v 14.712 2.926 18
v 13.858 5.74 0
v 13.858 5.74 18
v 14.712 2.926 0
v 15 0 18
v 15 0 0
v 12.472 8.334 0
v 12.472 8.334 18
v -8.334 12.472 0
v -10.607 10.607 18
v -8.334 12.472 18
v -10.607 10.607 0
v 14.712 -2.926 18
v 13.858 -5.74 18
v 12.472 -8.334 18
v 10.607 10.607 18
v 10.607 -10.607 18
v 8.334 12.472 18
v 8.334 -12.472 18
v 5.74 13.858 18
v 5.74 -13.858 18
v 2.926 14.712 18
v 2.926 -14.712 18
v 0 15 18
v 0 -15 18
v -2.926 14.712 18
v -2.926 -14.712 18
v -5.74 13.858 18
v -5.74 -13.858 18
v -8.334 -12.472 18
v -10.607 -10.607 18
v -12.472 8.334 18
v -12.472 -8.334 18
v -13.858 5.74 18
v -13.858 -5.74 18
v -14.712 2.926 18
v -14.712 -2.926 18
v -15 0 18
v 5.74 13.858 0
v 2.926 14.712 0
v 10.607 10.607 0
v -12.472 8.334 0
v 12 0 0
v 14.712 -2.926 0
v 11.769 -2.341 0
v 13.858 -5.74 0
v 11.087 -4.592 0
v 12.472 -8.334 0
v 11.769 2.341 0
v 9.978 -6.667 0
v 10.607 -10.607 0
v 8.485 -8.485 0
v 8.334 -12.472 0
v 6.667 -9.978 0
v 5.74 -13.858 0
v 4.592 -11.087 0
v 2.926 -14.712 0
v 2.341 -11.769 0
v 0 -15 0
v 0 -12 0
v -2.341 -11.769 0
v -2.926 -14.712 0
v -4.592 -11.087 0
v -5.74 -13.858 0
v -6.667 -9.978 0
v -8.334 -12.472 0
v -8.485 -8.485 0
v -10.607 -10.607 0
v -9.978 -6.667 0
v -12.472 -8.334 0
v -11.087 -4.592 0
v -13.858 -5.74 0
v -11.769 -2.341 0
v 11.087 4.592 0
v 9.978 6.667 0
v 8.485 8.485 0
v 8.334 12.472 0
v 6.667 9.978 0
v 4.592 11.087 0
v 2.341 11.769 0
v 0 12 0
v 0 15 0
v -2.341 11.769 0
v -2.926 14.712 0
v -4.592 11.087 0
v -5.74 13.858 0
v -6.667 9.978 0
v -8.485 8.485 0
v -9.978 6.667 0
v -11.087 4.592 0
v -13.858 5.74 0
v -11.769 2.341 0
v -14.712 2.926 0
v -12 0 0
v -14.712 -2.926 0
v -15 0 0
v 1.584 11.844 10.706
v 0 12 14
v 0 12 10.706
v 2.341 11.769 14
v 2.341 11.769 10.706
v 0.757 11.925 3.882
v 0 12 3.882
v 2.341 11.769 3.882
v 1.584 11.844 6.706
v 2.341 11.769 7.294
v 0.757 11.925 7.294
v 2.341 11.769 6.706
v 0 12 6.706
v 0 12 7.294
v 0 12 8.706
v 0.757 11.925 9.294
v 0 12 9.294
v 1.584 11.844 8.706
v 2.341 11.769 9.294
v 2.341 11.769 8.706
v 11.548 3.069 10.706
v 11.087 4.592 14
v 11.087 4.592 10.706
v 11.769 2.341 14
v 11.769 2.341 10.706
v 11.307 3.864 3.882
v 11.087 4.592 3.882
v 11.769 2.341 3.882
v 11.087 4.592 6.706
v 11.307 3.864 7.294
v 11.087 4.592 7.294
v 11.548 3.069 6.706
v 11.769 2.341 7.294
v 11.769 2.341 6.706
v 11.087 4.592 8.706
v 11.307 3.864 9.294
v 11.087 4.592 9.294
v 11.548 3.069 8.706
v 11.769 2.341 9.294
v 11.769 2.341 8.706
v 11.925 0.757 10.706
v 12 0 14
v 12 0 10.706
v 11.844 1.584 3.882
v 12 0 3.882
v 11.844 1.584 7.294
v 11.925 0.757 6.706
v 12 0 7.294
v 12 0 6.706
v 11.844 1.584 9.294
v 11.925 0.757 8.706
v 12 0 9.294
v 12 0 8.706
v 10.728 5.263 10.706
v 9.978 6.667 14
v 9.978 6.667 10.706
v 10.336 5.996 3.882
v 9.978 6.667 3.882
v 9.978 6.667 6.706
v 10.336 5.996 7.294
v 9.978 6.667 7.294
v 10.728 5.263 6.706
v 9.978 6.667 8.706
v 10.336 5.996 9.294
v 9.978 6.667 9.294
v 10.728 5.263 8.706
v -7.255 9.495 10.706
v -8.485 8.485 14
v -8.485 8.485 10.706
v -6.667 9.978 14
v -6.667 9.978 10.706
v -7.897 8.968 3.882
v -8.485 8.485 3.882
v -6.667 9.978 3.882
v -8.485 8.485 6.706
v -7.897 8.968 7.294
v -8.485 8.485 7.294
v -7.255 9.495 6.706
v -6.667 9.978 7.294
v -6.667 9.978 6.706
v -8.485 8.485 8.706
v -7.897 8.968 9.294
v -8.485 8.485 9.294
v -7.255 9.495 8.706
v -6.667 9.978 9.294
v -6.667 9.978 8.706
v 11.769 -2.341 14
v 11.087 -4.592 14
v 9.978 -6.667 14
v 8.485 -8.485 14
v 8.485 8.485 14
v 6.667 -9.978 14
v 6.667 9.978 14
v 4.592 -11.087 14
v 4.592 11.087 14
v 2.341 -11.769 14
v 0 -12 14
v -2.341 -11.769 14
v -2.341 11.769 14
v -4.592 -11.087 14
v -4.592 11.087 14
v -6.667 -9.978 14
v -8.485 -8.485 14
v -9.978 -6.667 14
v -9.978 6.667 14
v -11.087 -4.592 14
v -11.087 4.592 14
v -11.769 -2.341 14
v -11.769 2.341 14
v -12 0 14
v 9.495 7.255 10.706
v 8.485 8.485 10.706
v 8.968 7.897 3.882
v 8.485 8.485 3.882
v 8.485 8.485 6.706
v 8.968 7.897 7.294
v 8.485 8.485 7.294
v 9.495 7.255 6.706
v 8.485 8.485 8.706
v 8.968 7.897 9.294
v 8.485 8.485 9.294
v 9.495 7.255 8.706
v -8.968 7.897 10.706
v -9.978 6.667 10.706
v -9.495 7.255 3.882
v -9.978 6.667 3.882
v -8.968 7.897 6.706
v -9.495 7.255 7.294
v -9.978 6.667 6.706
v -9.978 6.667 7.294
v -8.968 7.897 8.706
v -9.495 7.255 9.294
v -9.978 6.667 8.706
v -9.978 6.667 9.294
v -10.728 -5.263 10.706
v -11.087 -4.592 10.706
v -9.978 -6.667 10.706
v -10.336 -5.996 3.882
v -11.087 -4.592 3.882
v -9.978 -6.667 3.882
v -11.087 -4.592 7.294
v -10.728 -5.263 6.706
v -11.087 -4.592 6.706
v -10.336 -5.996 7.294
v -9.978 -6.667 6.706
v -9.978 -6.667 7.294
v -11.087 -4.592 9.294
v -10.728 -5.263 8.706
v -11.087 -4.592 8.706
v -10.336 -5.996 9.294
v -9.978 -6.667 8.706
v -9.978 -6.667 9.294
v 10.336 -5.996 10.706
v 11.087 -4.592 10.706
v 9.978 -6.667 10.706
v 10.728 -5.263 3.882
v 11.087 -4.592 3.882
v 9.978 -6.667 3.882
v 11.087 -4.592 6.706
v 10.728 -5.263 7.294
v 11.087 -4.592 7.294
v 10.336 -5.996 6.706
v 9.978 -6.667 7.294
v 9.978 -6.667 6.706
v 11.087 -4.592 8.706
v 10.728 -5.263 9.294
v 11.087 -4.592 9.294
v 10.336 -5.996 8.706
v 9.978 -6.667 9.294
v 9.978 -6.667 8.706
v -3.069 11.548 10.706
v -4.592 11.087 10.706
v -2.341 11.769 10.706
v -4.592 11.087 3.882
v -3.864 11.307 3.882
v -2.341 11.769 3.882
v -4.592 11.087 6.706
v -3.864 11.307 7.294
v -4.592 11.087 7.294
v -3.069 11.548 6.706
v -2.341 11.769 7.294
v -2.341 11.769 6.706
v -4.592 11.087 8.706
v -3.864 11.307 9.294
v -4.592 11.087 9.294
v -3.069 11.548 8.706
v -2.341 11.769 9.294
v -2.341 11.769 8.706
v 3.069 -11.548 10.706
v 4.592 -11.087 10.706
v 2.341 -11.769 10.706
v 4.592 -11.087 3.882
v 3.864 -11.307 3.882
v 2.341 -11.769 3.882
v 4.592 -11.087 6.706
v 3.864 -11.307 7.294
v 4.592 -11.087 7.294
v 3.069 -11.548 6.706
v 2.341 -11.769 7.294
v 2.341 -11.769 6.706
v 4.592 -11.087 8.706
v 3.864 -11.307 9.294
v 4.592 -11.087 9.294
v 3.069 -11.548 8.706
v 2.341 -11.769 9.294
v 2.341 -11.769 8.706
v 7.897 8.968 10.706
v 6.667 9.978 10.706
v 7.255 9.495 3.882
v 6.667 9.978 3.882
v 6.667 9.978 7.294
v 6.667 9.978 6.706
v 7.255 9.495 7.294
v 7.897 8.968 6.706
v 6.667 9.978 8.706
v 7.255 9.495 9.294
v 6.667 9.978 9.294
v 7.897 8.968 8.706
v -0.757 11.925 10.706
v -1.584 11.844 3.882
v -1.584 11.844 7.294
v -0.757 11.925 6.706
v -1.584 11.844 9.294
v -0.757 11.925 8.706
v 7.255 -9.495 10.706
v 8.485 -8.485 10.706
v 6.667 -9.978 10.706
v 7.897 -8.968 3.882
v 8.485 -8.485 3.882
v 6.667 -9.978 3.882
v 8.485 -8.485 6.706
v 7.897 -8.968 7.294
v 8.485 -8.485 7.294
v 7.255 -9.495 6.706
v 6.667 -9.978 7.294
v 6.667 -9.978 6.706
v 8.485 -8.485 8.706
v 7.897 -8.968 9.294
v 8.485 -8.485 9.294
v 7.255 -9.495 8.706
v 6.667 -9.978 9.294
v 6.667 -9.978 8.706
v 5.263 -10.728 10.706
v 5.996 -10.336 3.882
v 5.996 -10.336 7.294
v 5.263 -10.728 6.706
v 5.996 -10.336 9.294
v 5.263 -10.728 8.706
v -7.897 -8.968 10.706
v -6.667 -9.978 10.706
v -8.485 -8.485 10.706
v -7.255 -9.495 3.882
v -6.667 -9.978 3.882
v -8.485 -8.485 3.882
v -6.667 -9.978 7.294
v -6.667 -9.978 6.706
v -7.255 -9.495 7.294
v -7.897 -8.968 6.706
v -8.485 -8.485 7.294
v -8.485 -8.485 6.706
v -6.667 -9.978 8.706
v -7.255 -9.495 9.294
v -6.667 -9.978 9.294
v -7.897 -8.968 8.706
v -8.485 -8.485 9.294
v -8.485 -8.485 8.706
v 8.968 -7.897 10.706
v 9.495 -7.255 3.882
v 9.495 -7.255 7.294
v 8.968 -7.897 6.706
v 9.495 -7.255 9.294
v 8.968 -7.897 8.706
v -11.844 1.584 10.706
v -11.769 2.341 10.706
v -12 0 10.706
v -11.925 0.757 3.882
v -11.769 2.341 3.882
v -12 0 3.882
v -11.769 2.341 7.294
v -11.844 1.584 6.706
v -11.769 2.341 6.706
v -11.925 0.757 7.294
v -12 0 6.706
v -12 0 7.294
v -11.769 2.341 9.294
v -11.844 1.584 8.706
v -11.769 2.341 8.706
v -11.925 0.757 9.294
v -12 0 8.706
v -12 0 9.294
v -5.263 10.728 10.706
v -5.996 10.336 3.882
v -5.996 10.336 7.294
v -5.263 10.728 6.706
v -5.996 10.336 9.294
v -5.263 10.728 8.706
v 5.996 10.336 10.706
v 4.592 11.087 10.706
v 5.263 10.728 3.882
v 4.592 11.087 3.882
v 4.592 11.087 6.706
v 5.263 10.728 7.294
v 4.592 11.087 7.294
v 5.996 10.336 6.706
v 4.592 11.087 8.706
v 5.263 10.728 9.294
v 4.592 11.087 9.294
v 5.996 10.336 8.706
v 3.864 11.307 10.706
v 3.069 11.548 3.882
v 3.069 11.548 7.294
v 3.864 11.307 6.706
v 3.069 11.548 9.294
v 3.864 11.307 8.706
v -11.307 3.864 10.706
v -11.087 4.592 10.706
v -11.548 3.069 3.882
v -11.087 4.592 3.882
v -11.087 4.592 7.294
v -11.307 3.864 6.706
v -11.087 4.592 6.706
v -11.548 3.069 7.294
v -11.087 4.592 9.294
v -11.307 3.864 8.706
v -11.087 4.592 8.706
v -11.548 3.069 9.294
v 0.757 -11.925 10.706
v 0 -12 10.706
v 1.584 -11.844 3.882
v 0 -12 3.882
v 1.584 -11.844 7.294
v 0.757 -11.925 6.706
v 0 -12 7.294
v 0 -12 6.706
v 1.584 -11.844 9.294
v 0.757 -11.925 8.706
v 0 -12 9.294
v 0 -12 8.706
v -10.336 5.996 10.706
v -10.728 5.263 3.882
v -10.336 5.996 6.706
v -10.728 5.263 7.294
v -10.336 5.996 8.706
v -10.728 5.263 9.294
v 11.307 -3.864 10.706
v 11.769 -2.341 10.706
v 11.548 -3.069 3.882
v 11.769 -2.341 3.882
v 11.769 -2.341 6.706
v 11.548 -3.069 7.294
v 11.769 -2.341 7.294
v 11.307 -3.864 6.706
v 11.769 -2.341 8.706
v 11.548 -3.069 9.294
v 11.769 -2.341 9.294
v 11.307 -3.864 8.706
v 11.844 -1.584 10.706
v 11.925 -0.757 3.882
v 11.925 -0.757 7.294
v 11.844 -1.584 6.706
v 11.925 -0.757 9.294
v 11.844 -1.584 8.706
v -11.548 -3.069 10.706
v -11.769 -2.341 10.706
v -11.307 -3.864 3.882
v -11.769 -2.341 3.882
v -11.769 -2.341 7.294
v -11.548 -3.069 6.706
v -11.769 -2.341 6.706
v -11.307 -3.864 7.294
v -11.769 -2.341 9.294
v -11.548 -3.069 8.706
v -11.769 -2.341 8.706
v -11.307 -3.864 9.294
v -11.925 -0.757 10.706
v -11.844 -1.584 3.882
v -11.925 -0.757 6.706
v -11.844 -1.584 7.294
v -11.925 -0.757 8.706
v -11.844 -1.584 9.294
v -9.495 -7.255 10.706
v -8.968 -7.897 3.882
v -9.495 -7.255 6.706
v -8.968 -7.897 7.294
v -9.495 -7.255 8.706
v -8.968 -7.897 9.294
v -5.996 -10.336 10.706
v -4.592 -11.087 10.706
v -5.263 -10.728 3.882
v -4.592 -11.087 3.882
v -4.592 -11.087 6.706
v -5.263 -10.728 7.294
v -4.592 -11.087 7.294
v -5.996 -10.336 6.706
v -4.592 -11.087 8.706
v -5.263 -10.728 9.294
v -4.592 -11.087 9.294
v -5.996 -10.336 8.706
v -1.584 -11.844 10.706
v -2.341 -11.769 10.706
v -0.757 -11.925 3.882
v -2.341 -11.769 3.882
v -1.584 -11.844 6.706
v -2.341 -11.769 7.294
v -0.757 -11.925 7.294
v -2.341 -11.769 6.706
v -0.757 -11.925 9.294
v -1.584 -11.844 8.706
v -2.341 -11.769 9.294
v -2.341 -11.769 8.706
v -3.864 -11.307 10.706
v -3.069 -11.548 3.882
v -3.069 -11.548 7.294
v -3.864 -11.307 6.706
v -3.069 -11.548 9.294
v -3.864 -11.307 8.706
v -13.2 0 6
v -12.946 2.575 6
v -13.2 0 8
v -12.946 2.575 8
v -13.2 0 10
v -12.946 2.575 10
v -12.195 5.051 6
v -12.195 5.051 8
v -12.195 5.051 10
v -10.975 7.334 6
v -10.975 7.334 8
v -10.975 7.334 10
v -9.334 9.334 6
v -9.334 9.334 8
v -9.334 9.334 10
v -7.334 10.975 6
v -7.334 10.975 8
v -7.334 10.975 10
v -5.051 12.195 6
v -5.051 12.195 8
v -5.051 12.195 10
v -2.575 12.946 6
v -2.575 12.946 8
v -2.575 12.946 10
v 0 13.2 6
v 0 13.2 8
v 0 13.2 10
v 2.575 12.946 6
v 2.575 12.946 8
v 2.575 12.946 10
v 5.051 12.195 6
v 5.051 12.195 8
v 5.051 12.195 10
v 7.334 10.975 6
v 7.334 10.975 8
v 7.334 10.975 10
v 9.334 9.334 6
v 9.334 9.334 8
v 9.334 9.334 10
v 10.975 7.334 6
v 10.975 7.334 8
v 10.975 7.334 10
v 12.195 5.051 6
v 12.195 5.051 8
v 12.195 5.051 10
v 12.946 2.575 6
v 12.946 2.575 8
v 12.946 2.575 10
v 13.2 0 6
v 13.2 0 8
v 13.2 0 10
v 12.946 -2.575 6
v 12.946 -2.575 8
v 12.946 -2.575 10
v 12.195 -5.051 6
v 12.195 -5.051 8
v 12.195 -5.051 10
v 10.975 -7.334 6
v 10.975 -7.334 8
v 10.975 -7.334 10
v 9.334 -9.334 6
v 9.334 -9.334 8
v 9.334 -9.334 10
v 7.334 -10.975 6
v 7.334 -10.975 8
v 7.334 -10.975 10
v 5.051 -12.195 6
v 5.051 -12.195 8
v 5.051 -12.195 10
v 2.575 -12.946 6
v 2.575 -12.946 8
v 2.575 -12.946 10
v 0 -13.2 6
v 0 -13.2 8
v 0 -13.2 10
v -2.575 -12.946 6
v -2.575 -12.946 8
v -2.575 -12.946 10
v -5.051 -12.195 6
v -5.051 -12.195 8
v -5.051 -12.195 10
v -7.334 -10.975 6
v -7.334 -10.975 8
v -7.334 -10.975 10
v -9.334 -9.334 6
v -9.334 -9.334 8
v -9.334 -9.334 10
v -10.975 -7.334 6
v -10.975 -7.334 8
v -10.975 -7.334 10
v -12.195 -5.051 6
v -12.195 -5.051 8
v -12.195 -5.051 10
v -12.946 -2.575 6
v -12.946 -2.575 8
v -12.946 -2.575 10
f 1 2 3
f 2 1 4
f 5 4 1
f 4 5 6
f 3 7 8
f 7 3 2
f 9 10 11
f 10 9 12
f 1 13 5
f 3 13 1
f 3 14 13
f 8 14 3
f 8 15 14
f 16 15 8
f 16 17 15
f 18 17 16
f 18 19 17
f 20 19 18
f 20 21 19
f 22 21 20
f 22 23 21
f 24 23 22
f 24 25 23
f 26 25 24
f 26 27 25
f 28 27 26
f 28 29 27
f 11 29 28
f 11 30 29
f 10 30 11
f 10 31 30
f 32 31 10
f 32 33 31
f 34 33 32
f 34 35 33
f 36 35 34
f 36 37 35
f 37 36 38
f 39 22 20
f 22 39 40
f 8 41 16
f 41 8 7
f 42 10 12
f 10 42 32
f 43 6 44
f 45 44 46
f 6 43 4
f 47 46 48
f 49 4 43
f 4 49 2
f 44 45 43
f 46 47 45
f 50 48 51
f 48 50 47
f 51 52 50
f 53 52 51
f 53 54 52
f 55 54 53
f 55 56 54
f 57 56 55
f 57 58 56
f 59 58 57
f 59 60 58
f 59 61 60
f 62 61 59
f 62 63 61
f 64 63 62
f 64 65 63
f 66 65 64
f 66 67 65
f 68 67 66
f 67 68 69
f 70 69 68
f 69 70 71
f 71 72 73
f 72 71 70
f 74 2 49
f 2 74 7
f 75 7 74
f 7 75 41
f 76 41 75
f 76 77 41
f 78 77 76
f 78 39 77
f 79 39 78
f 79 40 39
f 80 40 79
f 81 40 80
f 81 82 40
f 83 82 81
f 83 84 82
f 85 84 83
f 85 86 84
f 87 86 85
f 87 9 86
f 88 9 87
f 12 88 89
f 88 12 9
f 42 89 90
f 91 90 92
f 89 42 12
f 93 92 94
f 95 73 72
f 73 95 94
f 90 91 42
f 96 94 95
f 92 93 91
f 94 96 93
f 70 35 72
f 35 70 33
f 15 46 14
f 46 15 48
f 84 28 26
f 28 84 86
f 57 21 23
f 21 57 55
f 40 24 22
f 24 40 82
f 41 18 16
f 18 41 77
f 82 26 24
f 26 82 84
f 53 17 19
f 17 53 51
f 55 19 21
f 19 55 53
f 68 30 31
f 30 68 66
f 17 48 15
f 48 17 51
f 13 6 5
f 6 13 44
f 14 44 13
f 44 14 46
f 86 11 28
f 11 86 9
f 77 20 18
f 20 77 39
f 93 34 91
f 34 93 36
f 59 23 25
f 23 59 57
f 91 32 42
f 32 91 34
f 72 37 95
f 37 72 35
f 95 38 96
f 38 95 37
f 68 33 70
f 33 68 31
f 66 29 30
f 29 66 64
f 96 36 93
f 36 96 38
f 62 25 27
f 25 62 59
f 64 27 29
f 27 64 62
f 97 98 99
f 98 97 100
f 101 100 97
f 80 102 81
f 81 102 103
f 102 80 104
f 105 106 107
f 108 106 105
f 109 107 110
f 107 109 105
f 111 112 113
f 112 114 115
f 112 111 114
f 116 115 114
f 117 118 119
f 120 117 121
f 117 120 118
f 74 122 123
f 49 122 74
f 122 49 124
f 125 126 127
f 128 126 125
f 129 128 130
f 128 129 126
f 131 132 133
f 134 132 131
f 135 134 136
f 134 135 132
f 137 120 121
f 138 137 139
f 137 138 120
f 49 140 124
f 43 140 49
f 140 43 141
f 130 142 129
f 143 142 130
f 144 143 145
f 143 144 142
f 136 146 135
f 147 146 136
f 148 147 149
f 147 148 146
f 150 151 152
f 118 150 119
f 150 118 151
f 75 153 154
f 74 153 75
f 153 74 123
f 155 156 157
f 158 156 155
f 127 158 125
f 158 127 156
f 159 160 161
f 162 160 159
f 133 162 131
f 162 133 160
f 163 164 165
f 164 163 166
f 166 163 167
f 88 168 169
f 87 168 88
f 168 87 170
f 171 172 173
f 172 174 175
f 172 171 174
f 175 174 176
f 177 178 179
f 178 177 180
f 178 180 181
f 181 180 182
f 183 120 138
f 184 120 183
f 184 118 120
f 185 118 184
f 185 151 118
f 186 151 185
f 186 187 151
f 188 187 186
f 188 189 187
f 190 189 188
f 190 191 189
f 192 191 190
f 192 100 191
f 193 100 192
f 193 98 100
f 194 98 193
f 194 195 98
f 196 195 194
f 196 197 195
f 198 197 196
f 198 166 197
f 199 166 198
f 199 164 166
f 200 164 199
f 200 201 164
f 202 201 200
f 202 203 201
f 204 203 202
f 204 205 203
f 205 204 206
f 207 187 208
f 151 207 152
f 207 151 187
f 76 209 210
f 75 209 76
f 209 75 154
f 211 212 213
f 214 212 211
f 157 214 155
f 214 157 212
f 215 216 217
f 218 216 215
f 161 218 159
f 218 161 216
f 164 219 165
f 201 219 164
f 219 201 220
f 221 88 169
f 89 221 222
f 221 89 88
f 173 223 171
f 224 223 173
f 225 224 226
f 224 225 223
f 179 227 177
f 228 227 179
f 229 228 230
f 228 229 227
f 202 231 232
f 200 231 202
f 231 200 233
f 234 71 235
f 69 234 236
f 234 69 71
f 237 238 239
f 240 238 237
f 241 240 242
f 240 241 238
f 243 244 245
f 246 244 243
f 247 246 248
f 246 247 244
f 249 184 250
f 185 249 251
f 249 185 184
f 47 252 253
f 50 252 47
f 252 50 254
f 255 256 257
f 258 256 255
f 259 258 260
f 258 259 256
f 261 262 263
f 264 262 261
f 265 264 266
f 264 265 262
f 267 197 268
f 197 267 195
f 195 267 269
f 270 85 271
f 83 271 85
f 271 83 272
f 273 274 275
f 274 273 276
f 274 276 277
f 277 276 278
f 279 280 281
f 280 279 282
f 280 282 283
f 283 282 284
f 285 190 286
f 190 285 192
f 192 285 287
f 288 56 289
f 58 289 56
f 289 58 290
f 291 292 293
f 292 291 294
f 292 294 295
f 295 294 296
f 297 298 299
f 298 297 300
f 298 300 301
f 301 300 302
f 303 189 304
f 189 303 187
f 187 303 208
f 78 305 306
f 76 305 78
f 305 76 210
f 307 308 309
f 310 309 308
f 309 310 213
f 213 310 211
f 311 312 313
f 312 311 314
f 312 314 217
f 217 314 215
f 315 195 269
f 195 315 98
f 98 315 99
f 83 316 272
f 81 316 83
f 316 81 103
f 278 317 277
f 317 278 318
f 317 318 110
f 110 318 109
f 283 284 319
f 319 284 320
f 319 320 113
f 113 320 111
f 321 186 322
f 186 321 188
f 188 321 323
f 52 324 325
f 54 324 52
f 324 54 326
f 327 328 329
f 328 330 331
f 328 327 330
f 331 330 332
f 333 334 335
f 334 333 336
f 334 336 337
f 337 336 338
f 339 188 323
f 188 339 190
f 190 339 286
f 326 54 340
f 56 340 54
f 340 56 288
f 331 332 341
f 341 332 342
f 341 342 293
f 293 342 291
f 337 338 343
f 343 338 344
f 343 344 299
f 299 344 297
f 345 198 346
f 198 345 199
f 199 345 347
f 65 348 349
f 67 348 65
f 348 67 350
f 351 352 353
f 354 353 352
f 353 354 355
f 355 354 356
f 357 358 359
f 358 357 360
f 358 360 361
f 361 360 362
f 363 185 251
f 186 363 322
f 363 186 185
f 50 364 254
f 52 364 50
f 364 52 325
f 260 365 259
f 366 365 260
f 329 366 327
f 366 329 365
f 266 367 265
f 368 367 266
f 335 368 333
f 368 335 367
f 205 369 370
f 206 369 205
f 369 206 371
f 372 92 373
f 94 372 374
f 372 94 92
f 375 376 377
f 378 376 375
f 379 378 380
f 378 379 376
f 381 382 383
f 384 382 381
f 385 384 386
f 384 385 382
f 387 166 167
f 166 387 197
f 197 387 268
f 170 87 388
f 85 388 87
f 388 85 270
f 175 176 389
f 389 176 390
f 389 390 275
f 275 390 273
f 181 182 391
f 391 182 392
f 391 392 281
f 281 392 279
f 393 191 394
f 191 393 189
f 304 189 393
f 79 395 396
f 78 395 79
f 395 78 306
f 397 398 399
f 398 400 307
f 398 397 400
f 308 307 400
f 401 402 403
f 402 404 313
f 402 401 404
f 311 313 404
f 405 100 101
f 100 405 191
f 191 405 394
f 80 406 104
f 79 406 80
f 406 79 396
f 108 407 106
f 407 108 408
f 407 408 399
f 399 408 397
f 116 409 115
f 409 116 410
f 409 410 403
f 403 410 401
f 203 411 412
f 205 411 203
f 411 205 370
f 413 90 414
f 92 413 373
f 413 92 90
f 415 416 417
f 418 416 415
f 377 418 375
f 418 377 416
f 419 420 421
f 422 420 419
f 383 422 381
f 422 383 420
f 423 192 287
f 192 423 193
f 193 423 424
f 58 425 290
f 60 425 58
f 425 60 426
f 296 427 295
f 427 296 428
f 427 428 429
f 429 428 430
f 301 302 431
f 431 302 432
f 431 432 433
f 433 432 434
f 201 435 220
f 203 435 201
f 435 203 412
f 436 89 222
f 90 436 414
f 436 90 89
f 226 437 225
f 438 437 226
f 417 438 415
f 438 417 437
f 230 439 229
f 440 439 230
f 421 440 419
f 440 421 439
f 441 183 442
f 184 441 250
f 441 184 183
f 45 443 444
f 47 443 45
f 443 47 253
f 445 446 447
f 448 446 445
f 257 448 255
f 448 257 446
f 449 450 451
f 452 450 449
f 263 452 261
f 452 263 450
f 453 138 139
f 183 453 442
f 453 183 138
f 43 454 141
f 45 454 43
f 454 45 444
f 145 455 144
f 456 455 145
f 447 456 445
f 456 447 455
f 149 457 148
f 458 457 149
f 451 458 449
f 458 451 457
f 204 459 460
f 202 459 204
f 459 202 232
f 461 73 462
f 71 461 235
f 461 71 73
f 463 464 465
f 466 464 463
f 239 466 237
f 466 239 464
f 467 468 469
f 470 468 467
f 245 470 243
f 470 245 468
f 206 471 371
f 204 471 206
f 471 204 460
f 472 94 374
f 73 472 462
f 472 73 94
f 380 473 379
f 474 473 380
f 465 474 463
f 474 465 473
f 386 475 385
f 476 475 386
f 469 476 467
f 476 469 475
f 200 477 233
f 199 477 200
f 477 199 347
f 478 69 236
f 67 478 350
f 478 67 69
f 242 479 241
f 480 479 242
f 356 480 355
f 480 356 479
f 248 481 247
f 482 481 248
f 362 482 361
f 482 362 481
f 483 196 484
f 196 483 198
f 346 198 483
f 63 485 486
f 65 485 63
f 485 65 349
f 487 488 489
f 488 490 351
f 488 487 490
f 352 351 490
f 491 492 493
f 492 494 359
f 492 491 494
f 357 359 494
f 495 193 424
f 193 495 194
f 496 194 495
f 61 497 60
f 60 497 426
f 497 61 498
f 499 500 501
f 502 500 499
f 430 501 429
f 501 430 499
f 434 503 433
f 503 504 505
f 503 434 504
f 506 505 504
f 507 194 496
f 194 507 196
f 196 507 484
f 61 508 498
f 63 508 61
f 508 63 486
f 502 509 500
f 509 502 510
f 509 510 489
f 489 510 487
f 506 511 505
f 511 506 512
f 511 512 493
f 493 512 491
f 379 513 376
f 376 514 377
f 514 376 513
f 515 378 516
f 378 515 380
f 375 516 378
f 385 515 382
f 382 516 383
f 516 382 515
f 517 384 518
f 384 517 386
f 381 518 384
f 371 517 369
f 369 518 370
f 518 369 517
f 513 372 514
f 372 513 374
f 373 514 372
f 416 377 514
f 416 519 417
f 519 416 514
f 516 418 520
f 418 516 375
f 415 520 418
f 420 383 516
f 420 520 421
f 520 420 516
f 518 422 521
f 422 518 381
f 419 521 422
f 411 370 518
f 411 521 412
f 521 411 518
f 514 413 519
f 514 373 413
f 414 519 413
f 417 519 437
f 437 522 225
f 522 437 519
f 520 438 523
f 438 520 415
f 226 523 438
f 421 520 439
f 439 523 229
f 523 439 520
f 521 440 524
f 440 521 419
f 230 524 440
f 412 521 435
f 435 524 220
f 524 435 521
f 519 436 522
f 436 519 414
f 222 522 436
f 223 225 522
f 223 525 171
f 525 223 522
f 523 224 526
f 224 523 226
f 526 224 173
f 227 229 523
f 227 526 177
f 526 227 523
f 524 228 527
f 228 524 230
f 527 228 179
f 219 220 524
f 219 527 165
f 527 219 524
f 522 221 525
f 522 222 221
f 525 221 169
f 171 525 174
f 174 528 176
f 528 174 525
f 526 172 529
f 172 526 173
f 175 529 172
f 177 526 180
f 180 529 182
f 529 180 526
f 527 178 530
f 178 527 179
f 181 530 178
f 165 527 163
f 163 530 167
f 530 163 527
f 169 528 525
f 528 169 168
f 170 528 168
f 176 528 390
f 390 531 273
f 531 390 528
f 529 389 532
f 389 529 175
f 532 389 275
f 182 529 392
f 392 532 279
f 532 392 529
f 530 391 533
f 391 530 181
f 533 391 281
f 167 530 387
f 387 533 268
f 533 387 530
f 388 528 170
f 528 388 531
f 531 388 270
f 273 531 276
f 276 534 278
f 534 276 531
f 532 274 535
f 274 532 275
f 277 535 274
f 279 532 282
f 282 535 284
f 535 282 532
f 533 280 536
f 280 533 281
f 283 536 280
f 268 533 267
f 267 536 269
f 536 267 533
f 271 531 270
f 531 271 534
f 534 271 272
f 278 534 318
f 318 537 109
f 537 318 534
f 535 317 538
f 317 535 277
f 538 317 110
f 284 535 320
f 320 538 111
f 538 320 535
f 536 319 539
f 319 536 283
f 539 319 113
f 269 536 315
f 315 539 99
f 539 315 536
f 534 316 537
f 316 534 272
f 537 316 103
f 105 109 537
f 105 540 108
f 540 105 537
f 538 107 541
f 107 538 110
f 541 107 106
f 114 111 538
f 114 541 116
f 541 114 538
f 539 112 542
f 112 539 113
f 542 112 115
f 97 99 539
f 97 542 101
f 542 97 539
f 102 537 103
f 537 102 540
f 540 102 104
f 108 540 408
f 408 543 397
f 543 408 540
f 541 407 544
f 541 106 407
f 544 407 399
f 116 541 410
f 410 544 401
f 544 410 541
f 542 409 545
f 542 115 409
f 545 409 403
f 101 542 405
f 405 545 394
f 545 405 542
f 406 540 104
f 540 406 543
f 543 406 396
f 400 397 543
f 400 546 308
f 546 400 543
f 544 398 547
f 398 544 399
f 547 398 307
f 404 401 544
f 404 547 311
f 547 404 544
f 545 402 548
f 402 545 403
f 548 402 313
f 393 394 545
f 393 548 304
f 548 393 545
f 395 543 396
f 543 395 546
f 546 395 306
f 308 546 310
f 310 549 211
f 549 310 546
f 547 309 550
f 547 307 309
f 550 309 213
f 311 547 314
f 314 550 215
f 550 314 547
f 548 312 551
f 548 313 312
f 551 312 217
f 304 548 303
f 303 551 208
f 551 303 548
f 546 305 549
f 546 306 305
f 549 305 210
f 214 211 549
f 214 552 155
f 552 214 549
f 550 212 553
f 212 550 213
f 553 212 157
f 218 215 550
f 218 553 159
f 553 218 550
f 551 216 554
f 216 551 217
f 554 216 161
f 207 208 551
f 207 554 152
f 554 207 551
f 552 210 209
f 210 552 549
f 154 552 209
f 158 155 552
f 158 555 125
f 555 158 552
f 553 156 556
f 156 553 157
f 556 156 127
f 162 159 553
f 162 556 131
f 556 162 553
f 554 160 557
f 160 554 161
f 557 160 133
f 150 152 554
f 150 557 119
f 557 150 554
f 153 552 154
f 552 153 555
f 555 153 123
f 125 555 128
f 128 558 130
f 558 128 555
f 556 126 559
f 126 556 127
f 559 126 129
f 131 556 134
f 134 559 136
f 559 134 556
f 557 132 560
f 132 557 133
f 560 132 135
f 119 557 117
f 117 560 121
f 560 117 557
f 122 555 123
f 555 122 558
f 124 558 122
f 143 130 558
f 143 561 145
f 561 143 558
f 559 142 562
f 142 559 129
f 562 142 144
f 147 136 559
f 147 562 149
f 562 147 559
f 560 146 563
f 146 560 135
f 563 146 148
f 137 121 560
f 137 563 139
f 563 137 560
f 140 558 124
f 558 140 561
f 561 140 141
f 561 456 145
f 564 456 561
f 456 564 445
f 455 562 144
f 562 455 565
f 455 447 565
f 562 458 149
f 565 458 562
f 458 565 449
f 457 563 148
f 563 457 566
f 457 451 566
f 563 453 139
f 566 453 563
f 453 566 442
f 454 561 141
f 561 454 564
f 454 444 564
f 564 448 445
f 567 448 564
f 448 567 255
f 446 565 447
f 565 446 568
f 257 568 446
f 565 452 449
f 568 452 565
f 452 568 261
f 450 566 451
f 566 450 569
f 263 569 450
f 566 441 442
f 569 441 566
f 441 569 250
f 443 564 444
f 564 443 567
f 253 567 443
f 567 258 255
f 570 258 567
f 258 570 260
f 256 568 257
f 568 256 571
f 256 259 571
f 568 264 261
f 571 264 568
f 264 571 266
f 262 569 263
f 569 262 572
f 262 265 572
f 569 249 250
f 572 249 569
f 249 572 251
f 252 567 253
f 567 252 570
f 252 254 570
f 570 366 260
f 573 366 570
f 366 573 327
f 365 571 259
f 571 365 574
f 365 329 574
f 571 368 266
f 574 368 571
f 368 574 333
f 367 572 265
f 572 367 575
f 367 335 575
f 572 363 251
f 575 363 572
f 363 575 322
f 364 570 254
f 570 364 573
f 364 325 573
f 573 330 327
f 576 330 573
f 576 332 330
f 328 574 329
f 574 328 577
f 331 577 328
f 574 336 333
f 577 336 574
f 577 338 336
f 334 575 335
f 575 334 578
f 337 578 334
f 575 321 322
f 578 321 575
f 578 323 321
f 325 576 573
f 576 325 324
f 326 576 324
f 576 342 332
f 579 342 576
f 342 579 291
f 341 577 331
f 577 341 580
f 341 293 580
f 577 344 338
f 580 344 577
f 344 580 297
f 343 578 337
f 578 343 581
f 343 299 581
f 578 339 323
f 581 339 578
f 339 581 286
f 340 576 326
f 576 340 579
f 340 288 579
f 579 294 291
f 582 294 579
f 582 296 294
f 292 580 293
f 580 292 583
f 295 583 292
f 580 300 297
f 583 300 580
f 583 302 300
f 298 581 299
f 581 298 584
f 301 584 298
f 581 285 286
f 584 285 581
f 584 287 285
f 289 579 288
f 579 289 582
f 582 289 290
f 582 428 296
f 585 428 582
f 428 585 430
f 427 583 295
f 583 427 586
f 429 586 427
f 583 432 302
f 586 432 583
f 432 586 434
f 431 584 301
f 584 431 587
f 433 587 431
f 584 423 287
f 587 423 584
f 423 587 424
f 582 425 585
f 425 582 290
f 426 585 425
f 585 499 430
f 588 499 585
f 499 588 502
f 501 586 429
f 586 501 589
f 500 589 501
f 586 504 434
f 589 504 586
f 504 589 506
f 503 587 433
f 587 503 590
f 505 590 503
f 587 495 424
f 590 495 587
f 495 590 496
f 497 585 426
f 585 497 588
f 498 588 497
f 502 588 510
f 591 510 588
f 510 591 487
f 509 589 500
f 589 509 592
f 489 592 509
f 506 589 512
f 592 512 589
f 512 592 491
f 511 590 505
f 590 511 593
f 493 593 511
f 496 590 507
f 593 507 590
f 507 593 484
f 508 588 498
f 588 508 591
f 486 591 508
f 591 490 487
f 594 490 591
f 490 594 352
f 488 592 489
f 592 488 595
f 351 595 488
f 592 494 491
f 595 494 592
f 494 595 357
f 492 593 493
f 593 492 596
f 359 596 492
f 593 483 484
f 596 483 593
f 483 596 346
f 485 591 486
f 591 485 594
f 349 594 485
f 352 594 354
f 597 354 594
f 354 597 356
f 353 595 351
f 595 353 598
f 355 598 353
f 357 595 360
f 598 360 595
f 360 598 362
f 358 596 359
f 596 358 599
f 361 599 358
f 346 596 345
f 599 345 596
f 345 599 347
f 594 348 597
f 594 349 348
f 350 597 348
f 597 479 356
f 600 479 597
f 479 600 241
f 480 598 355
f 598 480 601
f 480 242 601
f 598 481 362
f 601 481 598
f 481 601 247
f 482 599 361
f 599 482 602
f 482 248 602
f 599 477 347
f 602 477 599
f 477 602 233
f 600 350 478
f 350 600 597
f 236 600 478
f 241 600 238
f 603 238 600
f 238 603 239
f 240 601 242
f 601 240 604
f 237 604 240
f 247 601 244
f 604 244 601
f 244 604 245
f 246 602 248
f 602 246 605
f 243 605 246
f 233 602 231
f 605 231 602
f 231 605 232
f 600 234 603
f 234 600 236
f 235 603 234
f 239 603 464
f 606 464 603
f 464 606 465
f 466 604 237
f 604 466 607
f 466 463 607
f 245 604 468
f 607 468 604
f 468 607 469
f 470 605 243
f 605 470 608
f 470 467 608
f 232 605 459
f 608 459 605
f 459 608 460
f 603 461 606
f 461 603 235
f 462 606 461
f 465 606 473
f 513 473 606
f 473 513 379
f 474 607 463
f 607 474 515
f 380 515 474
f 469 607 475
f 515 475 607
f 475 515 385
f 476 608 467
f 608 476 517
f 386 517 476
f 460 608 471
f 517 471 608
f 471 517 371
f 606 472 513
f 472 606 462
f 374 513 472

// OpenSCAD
$fn = 32;

// ----------------------------------------------------------------------
// Threaded cap: 30 mm body, 18 mm tall, 24 mm threaded bore
// ----------------------------------------------------------------------

// --- parameters (mm) ---
outer_d = 30;             // cap outside diameter
body_h = 18;              // cap height
top_t = 4;                // closed top thickness
bore_d = 24;              // bore core diameter
pitch = 2;                // thread pitch
thread_d = 1.2;           // thread depth
thread_z = 3;             // thread start above the rim
thread_h = 8;             // threaded height

difference() {
  union() {
    cylinder(h = 18, d = outer_d);
  }
  /* threaded bore, closed at the top */
  translate([0, 0, -2.5]) cylinder(h = 16.5, d = bore_d);
  translate([0, 0, 3]) rotate_extrude() polygon([[11, 0], [11, 8], [11.5, 8], [13.2, 7], [11.5, 6], [13.2, 5], [11.5, 4], [13.2, 3], [11.5, 0], [11, 0]]);
}
